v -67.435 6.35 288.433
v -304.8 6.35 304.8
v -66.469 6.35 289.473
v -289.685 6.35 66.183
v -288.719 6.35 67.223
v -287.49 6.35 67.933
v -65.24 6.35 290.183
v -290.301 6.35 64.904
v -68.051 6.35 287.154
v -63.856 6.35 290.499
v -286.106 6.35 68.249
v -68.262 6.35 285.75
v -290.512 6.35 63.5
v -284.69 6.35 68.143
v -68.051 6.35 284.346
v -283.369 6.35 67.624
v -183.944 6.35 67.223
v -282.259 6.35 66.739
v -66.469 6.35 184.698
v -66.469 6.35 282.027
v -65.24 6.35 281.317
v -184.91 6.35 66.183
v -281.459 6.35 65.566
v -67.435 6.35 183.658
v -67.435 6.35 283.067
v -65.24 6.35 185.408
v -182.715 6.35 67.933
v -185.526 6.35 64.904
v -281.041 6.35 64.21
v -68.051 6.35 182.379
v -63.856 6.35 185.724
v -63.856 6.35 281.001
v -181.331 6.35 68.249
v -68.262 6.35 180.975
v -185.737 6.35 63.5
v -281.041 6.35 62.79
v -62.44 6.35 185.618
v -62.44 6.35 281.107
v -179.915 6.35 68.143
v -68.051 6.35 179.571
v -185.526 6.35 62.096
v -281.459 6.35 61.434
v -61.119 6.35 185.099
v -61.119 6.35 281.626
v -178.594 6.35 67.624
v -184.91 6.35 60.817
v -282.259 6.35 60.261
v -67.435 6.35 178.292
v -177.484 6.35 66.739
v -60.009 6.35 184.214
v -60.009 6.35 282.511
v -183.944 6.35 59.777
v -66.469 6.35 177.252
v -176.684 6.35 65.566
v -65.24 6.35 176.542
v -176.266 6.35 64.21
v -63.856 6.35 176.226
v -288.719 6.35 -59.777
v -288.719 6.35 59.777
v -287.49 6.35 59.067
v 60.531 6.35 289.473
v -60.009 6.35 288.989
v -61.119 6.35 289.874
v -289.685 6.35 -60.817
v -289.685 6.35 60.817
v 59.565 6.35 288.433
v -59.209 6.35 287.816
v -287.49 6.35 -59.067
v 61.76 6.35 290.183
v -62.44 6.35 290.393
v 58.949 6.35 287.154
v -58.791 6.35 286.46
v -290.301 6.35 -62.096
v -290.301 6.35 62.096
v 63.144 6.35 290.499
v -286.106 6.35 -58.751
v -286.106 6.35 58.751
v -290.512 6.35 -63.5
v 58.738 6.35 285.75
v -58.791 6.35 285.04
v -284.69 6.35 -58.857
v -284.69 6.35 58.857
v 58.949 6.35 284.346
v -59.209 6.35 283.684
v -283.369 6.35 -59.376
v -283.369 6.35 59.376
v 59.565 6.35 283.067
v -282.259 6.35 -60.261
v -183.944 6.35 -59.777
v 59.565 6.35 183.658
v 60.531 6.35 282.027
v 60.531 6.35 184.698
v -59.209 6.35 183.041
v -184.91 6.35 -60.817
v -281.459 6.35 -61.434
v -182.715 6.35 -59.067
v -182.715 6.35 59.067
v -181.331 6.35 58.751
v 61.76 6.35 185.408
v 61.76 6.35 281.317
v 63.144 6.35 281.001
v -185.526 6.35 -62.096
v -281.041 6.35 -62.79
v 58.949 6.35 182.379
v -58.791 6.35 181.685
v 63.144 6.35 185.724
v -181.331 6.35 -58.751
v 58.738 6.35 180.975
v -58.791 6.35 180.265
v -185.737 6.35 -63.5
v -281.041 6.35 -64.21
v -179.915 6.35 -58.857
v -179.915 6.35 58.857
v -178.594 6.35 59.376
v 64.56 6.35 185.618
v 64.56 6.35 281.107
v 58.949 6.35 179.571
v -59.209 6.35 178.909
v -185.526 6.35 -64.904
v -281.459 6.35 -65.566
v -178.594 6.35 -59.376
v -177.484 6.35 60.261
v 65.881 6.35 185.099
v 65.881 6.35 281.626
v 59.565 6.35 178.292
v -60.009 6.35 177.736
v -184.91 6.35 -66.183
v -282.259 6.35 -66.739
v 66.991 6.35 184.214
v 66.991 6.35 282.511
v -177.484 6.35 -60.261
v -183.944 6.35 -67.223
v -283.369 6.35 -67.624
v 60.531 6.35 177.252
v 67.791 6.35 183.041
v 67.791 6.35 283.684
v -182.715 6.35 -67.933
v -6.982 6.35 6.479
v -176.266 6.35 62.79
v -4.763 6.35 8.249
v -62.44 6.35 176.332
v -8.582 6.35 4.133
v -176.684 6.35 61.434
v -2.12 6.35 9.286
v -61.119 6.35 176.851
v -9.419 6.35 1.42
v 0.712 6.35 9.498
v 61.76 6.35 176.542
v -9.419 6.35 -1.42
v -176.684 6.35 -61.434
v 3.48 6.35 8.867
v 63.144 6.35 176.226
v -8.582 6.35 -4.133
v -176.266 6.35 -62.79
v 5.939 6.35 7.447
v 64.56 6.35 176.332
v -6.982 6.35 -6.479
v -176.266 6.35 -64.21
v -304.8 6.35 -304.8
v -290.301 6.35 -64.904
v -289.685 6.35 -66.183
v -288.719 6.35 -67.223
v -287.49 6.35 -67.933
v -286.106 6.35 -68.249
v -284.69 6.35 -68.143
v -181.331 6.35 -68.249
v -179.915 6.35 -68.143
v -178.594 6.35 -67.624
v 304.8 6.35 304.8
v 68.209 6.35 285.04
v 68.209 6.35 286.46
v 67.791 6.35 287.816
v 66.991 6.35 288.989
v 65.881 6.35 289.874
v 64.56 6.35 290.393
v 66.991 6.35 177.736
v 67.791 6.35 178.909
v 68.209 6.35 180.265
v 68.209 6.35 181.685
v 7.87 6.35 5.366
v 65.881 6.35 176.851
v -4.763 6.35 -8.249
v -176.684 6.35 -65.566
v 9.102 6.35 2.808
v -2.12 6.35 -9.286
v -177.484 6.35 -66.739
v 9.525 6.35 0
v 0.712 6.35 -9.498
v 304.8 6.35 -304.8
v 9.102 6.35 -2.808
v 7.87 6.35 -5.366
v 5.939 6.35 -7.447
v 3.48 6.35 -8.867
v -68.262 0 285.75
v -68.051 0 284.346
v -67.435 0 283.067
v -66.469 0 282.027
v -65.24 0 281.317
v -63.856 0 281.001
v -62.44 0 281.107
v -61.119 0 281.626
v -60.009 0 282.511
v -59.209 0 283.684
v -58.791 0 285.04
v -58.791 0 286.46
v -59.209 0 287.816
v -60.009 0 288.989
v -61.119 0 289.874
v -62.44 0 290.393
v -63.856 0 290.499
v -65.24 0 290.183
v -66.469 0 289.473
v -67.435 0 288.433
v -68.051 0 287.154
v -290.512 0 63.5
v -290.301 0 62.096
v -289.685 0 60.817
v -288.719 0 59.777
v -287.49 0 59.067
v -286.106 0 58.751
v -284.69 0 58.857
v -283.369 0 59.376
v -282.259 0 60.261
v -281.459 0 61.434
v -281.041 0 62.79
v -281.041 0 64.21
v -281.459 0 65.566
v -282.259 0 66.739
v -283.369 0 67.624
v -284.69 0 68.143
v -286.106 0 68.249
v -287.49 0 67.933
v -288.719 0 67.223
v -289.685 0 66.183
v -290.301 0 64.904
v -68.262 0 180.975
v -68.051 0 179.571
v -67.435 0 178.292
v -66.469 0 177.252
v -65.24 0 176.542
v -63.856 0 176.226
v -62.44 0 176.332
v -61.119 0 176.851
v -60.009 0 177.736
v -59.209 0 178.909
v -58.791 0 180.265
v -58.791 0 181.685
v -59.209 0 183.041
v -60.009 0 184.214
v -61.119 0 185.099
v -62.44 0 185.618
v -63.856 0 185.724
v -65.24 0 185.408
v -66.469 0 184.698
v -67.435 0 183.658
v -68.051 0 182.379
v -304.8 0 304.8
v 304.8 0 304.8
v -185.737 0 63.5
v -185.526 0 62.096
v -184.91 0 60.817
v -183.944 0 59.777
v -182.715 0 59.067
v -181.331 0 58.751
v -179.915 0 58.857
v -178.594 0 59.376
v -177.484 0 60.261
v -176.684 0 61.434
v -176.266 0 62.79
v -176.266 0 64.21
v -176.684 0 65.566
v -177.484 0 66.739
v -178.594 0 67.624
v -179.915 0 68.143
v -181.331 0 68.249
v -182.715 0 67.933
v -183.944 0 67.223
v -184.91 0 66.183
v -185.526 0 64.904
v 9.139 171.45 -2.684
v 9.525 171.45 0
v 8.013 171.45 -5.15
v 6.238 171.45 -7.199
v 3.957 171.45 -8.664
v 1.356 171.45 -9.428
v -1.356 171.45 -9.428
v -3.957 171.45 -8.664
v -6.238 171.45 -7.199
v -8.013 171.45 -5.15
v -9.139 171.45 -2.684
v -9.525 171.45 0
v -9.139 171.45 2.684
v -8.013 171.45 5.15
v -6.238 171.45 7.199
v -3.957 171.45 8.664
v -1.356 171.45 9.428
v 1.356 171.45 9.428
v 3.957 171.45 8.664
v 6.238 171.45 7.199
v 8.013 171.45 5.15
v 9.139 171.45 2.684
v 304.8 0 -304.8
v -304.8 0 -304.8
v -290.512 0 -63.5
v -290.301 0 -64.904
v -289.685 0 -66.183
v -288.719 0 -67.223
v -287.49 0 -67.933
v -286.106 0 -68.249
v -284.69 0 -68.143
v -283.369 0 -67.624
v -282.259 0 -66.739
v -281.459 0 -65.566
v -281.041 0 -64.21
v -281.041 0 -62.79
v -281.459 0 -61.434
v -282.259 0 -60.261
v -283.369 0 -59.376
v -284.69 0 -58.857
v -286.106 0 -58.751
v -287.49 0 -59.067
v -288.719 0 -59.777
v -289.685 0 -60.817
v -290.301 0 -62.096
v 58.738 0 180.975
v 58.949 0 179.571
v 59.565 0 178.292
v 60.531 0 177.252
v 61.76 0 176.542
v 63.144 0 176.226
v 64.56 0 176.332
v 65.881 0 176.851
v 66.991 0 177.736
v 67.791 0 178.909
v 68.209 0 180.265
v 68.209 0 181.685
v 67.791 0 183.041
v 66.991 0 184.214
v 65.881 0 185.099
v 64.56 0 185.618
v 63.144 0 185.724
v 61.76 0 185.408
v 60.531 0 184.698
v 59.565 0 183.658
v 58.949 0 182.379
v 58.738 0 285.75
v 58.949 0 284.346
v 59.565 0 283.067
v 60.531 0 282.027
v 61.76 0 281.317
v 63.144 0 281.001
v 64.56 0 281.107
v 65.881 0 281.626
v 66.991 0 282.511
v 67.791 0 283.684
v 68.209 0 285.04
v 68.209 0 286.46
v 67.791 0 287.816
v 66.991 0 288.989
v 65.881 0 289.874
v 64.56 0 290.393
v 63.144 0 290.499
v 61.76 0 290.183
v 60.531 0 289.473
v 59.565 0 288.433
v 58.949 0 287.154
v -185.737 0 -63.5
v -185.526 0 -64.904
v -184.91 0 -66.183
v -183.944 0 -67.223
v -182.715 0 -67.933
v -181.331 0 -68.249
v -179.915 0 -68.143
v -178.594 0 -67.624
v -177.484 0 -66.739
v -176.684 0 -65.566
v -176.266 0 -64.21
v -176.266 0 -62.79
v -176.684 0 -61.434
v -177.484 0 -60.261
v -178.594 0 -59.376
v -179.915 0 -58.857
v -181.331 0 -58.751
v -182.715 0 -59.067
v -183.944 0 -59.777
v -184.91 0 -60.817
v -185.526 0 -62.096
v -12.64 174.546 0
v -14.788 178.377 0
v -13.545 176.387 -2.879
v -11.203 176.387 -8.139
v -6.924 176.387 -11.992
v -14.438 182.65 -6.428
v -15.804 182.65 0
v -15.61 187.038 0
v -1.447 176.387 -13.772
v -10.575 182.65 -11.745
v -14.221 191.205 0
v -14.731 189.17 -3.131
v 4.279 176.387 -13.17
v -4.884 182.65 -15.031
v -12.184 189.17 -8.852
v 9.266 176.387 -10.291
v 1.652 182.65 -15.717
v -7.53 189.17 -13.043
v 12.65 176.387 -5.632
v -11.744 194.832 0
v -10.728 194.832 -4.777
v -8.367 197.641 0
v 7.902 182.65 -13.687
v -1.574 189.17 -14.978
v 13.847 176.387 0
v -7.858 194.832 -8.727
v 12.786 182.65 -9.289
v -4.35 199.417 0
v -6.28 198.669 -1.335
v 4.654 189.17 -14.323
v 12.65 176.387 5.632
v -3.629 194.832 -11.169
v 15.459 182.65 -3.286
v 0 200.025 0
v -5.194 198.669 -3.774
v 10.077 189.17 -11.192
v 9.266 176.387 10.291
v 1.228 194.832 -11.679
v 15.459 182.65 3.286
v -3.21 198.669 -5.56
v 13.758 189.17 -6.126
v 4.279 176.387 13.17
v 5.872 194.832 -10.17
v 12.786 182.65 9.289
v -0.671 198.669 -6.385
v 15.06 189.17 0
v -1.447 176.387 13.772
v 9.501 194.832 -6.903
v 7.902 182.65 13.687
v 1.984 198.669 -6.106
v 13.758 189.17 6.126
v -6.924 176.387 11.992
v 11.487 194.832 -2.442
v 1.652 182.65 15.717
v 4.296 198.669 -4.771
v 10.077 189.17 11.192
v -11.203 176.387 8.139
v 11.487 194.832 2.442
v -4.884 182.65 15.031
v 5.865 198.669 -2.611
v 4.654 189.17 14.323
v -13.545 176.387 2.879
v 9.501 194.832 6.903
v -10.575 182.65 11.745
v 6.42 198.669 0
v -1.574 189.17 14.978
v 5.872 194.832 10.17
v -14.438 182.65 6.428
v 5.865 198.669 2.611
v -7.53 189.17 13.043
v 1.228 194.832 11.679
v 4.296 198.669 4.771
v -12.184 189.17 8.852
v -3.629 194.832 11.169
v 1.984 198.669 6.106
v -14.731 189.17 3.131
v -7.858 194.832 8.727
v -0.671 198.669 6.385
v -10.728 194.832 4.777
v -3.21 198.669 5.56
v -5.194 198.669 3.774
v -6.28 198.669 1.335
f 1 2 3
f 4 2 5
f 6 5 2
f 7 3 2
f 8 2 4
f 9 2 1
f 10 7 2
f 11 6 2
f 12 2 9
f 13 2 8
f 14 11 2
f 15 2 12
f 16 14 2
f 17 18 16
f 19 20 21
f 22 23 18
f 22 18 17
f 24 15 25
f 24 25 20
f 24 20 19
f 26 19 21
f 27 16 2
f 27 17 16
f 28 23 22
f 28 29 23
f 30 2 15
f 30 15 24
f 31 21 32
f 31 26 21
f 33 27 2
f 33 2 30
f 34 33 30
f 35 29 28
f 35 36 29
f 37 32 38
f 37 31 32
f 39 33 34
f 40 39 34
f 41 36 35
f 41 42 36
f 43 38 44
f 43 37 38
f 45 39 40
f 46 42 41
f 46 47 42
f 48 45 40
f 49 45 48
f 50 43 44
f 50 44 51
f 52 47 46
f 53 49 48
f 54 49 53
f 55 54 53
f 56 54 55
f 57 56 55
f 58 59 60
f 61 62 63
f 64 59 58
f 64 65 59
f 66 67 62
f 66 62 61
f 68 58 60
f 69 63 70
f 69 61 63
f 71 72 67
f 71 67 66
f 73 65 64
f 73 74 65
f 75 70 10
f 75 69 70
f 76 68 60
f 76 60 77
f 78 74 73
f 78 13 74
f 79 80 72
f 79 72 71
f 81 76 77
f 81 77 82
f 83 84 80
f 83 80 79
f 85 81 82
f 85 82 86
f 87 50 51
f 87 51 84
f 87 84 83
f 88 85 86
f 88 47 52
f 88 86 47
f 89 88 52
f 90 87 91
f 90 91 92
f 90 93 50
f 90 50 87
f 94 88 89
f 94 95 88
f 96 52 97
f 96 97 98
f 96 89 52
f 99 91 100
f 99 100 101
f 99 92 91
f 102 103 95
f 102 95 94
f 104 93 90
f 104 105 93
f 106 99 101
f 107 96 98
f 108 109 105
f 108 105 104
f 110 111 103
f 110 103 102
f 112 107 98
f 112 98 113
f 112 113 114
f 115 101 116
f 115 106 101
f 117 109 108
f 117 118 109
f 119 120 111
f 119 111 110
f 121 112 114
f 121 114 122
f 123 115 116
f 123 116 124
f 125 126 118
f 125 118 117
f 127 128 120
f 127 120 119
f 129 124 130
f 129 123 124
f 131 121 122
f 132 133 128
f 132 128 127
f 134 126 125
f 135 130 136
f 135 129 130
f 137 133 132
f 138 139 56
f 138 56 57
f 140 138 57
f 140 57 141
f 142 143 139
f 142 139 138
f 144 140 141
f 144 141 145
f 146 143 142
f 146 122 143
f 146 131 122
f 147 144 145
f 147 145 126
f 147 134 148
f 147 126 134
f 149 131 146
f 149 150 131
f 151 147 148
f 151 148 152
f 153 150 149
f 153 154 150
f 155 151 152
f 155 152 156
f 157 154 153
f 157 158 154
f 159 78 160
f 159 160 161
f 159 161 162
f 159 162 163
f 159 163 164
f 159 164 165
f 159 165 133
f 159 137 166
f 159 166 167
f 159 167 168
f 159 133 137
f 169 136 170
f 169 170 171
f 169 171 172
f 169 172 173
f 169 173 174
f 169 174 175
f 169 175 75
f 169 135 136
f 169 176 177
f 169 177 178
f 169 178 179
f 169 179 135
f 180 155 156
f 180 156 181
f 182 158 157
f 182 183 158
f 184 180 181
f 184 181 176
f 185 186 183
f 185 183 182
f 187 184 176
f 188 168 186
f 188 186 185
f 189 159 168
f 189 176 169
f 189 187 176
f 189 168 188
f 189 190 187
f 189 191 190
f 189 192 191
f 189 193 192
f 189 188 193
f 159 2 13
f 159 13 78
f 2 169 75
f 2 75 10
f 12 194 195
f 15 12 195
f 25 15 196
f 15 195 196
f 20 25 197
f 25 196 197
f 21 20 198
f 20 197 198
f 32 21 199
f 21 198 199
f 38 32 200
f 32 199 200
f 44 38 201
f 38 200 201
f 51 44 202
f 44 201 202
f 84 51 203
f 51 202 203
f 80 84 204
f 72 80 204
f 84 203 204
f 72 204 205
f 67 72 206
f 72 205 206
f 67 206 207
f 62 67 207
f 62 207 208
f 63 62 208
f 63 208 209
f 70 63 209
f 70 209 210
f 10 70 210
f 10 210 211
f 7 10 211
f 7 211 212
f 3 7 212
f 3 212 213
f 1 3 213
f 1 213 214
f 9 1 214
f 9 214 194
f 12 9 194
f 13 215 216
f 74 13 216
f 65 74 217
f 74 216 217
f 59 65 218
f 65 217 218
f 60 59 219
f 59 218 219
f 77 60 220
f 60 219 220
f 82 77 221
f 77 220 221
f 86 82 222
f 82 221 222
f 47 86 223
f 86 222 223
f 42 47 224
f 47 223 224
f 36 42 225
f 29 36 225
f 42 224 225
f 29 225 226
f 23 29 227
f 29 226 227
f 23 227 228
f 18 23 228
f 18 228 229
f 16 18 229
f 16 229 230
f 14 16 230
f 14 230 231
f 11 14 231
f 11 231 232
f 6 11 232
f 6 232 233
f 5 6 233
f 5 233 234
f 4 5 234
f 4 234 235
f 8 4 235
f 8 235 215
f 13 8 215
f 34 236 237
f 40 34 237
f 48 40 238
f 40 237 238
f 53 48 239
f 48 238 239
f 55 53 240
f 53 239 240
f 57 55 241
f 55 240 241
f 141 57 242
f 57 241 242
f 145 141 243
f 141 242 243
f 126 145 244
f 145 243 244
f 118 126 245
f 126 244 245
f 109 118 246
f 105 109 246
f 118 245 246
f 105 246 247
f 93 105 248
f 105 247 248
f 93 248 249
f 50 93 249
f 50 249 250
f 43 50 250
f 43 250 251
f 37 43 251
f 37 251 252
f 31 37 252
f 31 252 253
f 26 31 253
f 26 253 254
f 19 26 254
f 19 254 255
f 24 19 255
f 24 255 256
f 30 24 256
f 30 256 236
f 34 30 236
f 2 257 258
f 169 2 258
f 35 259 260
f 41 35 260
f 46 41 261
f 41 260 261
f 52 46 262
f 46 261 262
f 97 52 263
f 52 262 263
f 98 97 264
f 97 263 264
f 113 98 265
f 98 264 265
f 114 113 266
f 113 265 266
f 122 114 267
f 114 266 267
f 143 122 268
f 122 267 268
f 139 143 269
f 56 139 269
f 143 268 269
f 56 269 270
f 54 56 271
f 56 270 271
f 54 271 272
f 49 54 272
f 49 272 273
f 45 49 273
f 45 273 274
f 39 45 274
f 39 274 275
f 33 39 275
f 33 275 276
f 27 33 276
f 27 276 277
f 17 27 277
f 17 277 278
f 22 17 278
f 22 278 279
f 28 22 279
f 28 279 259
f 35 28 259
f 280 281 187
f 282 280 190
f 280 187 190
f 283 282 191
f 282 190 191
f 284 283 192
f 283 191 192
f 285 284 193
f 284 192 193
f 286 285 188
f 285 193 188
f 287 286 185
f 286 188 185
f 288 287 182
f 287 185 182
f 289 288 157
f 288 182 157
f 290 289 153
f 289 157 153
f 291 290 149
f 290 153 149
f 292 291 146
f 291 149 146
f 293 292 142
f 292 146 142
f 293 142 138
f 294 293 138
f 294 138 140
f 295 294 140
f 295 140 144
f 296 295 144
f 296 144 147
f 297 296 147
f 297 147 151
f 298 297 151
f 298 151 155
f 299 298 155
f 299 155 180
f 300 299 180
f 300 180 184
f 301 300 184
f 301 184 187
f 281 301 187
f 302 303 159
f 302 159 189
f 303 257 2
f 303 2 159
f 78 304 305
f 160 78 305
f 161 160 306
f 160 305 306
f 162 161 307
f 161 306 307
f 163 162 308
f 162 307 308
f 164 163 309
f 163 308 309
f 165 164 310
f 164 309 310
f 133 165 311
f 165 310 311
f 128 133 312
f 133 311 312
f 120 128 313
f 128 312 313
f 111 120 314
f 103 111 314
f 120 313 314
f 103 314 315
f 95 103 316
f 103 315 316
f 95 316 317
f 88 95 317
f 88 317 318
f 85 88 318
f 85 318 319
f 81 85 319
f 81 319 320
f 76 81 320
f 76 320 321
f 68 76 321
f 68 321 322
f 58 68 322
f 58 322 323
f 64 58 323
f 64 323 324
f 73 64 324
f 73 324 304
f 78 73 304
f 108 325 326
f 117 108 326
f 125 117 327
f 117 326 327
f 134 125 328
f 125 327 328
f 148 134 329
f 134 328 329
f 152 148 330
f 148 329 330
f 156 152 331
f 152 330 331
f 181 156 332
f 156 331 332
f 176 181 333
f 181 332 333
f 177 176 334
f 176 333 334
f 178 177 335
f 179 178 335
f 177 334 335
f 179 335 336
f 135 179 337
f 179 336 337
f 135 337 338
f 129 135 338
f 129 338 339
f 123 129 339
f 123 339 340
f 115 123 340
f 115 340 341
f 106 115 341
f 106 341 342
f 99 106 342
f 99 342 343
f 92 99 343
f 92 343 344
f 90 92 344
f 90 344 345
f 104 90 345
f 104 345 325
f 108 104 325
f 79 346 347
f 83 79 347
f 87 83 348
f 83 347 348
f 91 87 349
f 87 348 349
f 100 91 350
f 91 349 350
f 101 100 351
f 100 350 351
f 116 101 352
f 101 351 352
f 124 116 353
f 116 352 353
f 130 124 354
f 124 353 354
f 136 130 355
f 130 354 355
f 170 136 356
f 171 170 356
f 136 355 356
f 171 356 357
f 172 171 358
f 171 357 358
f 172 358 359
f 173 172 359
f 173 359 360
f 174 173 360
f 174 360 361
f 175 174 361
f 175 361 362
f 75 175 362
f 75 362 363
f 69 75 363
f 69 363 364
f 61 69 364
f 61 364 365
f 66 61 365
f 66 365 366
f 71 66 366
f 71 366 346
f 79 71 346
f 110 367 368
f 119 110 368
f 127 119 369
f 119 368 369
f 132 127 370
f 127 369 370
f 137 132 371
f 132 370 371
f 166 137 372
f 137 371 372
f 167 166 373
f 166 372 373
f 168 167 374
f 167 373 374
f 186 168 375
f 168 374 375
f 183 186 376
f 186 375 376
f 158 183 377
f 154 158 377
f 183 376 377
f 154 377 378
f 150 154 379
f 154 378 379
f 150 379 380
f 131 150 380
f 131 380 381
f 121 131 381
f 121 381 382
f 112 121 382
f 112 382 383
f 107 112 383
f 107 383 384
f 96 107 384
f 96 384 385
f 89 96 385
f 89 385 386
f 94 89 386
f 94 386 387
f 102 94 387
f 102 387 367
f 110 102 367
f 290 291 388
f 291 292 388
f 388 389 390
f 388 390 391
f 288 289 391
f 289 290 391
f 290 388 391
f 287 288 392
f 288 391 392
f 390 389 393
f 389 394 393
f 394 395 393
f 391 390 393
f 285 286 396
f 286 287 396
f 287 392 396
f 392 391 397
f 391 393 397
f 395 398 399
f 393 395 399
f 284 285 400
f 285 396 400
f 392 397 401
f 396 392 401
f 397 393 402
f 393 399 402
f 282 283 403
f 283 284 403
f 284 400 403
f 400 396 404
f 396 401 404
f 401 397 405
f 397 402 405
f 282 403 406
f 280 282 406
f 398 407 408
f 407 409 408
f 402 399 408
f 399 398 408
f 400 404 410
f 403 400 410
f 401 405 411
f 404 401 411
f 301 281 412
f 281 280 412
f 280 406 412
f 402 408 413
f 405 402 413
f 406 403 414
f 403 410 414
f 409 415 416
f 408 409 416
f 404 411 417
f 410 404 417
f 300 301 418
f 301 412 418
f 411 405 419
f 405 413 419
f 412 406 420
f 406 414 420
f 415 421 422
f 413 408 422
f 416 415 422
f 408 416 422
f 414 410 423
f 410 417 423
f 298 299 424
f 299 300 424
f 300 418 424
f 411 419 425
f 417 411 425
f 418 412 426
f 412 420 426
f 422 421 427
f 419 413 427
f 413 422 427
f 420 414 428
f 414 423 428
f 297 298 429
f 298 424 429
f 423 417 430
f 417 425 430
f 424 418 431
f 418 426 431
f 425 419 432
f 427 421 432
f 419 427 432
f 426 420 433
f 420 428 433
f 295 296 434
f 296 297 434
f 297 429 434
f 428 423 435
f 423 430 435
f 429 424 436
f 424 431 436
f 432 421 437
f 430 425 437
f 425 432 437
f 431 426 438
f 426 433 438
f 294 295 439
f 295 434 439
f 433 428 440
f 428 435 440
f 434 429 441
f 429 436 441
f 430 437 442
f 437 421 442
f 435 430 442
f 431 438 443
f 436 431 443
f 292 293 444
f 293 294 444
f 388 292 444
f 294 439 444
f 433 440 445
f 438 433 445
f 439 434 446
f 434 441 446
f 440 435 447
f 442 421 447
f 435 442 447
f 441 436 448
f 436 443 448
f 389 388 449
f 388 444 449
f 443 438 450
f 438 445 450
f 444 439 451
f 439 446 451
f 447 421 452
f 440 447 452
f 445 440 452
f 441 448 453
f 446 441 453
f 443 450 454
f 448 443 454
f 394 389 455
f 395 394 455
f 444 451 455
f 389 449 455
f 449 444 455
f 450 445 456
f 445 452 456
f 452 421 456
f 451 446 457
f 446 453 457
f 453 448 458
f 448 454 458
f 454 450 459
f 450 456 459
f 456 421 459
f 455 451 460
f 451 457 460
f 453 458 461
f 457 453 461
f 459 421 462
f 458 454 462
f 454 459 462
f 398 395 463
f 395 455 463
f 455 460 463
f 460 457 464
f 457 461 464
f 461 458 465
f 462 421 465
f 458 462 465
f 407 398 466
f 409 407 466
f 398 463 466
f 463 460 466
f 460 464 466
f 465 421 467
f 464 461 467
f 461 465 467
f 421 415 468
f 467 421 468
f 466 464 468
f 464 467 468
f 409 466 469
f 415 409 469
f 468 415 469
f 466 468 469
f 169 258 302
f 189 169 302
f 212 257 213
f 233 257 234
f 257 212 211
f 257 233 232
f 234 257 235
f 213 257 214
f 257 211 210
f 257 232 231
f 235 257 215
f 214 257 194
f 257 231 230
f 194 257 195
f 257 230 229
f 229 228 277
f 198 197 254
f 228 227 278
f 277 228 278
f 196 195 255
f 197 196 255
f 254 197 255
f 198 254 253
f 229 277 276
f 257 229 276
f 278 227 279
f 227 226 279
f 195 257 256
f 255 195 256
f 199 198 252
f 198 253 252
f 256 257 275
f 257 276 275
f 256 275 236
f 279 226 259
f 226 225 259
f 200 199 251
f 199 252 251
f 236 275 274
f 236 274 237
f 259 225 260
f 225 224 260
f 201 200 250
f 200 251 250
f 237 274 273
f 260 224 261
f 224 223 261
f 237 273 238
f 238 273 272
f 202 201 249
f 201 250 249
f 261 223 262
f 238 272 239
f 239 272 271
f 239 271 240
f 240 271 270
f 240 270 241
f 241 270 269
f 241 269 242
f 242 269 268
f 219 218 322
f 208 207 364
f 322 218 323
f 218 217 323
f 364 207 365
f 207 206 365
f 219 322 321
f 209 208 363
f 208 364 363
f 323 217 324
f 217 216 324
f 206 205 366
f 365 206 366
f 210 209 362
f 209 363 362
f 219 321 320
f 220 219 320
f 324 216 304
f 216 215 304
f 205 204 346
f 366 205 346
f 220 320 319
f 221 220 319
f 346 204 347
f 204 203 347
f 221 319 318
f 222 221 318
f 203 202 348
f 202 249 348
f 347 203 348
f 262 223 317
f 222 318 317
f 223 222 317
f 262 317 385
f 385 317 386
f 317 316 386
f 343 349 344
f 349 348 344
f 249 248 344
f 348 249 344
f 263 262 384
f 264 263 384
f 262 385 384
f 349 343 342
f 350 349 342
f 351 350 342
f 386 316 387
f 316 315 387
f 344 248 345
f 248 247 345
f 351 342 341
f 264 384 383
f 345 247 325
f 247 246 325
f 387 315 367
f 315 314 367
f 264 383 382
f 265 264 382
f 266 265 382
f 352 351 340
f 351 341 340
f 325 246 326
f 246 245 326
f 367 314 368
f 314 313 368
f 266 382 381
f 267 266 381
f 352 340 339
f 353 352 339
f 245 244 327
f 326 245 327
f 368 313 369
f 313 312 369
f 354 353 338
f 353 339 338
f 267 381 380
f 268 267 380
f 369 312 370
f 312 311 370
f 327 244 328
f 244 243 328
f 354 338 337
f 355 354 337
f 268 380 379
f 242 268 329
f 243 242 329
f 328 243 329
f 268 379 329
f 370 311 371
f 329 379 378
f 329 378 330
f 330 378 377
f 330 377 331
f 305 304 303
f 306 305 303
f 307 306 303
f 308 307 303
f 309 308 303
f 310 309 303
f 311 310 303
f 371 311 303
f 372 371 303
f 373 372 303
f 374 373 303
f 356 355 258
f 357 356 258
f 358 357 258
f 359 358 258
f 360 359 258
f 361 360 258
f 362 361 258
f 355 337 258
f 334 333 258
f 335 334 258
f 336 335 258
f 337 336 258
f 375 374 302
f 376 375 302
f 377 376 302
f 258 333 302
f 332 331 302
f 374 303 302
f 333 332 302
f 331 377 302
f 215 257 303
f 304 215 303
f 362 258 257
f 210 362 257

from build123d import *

# Parameters (mm, degrees)
SKETCH1_W                        = 609.6
SKETCH1_H                        = 609.6
BOSS_EXTRUDE1_DEPTH              = 6.35
F_3_8_0_375_DIAMETER_HOLE1_D     = 9.525
F_3_8_0_375_DIAMETER_HOLE1_DEPTH = 11.684
F_3_8_0_375_DIAMETER_HOLE1_TIP   = 2.861598698
SKETCH4_R                        = 9.525
BOSS_EXTRUDE2_DEPTH              = 165.1


with BuildPart() as part:
    # Sketch1 → Boss-Extrude1 (new body)
    with BuildSketch(Plane(origin=(0, 0, 0), x_dir=(1, 0, 0), z_dir=(0, 1, 0))):
        Rectangle(SKETCH1_W, SKETCH1_H)
    extrude(amount=BOSS_EXTRUDE1_DEPTH)

    # 3/8 (0.375) Diameter Hole1
    with Locations(Plane(origin=(0, 6.35, 0), x_dir=(1, 0, 0), z_dir=(0, 1, 0))):
        with Locations((-63.5, -285.75), (63.5, -285.75), (-285.75, 63.5), (-285.75, -63.5), (-63.5, -180.975), (63.5, -180.975), (-180.975, -63.5), (-180.975, 63.5)):
            Hole(F_3_8_0_375_DIAMETER_HOLE1_D / 2, depth=F_3_8_0_375_DIAMETER_HOLE1_DEPTH)
            with Locations((0, 0, -(F_3_8_0_375_DIAMETER_HOLE1_DEPTH + F_3_8_0_375_DIAMETER_HOLE1_TIP / 2))):  # 118° drill point
                Cone(0, F_3_8_0_375_DIAMETER_HOLE1_D / 2, F_3_8_0_375_DIAMETER_HOLE1_TIP, mode=Mode.SUBTRACT)

    # Sketch4 → Boss-Extrude2 (add)
    with BuildSketch(Plane(origin=(0, 6.35, 0), x_dir=(1, 0, 0), z_dir=(0, 1, 0))):
        Circle(SKETCH4_R)
    extrude(amount=BOSS_EXTRUDE2_DEPTH)

    # Sketch5 → Revolve3 (revolve)
    with BuildSketch(Plane.XY):
        with BuildLine():
            Line((0, 200.025), (0, 168.275))
            ThreePointArc((0, 168.275), (-15.875, 184.15), (0, 200.025))
        make_face()
    revolve(axis=Axis((0, 599.823656089, 0), (0, -1, 0)))


solid = part.part
